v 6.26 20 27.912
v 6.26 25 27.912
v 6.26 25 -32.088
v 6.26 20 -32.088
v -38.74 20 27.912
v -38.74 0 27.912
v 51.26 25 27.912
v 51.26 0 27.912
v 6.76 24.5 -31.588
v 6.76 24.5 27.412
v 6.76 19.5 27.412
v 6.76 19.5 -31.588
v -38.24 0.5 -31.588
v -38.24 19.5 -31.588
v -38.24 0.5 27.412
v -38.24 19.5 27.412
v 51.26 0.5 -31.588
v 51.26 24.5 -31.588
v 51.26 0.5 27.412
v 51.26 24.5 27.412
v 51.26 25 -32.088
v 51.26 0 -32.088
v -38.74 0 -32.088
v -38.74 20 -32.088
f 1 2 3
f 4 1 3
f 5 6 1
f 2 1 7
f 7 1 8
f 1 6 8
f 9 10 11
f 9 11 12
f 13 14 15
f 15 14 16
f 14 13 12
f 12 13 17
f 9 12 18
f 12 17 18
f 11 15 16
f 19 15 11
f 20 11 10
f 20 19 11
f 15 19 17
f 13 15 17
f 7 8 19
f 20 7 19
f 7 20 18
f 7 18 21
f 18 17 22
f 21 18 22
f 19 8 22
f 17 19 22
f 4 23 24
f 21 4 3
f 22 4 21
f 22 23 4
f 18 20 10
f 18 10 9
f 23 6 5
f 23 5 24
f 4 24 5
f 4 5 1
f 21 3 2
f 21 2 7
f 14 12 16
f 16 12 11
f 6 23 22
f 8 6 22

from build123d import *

# Parameters (mm, degrees)
SKETCH1_W           = 90
SKETCH1_H           = 60
BOSS_EXTRUDE2_DEPTH = 25
CUT_EXTRUDE1_START  = 25
SKETCH2_W           = 45
SKETCH2_H           = 60
CUT_EXTRUDE1_DEPTH  = 5
SKETCH4_W           = 59
SKETCH4_H           = 24
CUT_EXTRUDE3_DEPTH  = 44.5
CUT_EXTRUDE4_START  = -45.5
SKETCH5_W           = 59
SKETCH5_H           = 19
CUT_EXTRUDE4_DEPTH  = 45


with BuildPart() as part:
    # Sketch1 → Boss-Extrude2 (new body)
    with BuildSketch(Plane(origin=(0, 0, 0), x_dir=(1, 0, 0), z_dir=(0, 1, 0))):
        with Locations((6.260188088, 2.087774295)):
            Rectangle(SKETCH1_W, SKETCH1_H)
    extrude(amount=BOSS_EXTRUDE2_DEPTH)

    # Sketch2 → Cut-Extrude1 (cut)
    with BuildSketch(Plane(origin=(0, 0, 0), x_dir=(1, 0, 0), z_dir=(0, 1, 0)).offset(CUT_EXTRUDE1_START)):
        with Locations((-16.239811912, 2.087774295)):
            Rectangle(SKETCH2_W, SKETCH2_H)
    extrude(amount=-CUT_EXTRUDE1_DEPTH, mode=Mode.SUBTRACT)

    # Sketch4 → Cut-Extrude3 (cut)
    with BuildSketch(Plane(origin=(51.260188088, 0, 0), x_dir=(0, 0, -1), z_dir=(1, 0, 0))):
        with Locations((2.087774295, 12.5)):
            Rectangle(SKETCH4_W, SKETCH4_H)
    extrude(amount=-CUT_EXTRUDE3_DEPTH, mode=Mode.SUBTRACT)

    # Sketch5 → Cut-Extrude4 (cut)
    with BuildSketch(Plane.ZY.offset(38.739811912).offset(CUT_EXTRUDE4_START)):
        with Locations((-2.087774295, 10)):
            Rectangle(SKETCH5_W, SKETCH5_H)
    extrude(amount=CUT_EXTRUDE4_DEPTH, mode=Mode.SUBTRACT)


solid = part.part
